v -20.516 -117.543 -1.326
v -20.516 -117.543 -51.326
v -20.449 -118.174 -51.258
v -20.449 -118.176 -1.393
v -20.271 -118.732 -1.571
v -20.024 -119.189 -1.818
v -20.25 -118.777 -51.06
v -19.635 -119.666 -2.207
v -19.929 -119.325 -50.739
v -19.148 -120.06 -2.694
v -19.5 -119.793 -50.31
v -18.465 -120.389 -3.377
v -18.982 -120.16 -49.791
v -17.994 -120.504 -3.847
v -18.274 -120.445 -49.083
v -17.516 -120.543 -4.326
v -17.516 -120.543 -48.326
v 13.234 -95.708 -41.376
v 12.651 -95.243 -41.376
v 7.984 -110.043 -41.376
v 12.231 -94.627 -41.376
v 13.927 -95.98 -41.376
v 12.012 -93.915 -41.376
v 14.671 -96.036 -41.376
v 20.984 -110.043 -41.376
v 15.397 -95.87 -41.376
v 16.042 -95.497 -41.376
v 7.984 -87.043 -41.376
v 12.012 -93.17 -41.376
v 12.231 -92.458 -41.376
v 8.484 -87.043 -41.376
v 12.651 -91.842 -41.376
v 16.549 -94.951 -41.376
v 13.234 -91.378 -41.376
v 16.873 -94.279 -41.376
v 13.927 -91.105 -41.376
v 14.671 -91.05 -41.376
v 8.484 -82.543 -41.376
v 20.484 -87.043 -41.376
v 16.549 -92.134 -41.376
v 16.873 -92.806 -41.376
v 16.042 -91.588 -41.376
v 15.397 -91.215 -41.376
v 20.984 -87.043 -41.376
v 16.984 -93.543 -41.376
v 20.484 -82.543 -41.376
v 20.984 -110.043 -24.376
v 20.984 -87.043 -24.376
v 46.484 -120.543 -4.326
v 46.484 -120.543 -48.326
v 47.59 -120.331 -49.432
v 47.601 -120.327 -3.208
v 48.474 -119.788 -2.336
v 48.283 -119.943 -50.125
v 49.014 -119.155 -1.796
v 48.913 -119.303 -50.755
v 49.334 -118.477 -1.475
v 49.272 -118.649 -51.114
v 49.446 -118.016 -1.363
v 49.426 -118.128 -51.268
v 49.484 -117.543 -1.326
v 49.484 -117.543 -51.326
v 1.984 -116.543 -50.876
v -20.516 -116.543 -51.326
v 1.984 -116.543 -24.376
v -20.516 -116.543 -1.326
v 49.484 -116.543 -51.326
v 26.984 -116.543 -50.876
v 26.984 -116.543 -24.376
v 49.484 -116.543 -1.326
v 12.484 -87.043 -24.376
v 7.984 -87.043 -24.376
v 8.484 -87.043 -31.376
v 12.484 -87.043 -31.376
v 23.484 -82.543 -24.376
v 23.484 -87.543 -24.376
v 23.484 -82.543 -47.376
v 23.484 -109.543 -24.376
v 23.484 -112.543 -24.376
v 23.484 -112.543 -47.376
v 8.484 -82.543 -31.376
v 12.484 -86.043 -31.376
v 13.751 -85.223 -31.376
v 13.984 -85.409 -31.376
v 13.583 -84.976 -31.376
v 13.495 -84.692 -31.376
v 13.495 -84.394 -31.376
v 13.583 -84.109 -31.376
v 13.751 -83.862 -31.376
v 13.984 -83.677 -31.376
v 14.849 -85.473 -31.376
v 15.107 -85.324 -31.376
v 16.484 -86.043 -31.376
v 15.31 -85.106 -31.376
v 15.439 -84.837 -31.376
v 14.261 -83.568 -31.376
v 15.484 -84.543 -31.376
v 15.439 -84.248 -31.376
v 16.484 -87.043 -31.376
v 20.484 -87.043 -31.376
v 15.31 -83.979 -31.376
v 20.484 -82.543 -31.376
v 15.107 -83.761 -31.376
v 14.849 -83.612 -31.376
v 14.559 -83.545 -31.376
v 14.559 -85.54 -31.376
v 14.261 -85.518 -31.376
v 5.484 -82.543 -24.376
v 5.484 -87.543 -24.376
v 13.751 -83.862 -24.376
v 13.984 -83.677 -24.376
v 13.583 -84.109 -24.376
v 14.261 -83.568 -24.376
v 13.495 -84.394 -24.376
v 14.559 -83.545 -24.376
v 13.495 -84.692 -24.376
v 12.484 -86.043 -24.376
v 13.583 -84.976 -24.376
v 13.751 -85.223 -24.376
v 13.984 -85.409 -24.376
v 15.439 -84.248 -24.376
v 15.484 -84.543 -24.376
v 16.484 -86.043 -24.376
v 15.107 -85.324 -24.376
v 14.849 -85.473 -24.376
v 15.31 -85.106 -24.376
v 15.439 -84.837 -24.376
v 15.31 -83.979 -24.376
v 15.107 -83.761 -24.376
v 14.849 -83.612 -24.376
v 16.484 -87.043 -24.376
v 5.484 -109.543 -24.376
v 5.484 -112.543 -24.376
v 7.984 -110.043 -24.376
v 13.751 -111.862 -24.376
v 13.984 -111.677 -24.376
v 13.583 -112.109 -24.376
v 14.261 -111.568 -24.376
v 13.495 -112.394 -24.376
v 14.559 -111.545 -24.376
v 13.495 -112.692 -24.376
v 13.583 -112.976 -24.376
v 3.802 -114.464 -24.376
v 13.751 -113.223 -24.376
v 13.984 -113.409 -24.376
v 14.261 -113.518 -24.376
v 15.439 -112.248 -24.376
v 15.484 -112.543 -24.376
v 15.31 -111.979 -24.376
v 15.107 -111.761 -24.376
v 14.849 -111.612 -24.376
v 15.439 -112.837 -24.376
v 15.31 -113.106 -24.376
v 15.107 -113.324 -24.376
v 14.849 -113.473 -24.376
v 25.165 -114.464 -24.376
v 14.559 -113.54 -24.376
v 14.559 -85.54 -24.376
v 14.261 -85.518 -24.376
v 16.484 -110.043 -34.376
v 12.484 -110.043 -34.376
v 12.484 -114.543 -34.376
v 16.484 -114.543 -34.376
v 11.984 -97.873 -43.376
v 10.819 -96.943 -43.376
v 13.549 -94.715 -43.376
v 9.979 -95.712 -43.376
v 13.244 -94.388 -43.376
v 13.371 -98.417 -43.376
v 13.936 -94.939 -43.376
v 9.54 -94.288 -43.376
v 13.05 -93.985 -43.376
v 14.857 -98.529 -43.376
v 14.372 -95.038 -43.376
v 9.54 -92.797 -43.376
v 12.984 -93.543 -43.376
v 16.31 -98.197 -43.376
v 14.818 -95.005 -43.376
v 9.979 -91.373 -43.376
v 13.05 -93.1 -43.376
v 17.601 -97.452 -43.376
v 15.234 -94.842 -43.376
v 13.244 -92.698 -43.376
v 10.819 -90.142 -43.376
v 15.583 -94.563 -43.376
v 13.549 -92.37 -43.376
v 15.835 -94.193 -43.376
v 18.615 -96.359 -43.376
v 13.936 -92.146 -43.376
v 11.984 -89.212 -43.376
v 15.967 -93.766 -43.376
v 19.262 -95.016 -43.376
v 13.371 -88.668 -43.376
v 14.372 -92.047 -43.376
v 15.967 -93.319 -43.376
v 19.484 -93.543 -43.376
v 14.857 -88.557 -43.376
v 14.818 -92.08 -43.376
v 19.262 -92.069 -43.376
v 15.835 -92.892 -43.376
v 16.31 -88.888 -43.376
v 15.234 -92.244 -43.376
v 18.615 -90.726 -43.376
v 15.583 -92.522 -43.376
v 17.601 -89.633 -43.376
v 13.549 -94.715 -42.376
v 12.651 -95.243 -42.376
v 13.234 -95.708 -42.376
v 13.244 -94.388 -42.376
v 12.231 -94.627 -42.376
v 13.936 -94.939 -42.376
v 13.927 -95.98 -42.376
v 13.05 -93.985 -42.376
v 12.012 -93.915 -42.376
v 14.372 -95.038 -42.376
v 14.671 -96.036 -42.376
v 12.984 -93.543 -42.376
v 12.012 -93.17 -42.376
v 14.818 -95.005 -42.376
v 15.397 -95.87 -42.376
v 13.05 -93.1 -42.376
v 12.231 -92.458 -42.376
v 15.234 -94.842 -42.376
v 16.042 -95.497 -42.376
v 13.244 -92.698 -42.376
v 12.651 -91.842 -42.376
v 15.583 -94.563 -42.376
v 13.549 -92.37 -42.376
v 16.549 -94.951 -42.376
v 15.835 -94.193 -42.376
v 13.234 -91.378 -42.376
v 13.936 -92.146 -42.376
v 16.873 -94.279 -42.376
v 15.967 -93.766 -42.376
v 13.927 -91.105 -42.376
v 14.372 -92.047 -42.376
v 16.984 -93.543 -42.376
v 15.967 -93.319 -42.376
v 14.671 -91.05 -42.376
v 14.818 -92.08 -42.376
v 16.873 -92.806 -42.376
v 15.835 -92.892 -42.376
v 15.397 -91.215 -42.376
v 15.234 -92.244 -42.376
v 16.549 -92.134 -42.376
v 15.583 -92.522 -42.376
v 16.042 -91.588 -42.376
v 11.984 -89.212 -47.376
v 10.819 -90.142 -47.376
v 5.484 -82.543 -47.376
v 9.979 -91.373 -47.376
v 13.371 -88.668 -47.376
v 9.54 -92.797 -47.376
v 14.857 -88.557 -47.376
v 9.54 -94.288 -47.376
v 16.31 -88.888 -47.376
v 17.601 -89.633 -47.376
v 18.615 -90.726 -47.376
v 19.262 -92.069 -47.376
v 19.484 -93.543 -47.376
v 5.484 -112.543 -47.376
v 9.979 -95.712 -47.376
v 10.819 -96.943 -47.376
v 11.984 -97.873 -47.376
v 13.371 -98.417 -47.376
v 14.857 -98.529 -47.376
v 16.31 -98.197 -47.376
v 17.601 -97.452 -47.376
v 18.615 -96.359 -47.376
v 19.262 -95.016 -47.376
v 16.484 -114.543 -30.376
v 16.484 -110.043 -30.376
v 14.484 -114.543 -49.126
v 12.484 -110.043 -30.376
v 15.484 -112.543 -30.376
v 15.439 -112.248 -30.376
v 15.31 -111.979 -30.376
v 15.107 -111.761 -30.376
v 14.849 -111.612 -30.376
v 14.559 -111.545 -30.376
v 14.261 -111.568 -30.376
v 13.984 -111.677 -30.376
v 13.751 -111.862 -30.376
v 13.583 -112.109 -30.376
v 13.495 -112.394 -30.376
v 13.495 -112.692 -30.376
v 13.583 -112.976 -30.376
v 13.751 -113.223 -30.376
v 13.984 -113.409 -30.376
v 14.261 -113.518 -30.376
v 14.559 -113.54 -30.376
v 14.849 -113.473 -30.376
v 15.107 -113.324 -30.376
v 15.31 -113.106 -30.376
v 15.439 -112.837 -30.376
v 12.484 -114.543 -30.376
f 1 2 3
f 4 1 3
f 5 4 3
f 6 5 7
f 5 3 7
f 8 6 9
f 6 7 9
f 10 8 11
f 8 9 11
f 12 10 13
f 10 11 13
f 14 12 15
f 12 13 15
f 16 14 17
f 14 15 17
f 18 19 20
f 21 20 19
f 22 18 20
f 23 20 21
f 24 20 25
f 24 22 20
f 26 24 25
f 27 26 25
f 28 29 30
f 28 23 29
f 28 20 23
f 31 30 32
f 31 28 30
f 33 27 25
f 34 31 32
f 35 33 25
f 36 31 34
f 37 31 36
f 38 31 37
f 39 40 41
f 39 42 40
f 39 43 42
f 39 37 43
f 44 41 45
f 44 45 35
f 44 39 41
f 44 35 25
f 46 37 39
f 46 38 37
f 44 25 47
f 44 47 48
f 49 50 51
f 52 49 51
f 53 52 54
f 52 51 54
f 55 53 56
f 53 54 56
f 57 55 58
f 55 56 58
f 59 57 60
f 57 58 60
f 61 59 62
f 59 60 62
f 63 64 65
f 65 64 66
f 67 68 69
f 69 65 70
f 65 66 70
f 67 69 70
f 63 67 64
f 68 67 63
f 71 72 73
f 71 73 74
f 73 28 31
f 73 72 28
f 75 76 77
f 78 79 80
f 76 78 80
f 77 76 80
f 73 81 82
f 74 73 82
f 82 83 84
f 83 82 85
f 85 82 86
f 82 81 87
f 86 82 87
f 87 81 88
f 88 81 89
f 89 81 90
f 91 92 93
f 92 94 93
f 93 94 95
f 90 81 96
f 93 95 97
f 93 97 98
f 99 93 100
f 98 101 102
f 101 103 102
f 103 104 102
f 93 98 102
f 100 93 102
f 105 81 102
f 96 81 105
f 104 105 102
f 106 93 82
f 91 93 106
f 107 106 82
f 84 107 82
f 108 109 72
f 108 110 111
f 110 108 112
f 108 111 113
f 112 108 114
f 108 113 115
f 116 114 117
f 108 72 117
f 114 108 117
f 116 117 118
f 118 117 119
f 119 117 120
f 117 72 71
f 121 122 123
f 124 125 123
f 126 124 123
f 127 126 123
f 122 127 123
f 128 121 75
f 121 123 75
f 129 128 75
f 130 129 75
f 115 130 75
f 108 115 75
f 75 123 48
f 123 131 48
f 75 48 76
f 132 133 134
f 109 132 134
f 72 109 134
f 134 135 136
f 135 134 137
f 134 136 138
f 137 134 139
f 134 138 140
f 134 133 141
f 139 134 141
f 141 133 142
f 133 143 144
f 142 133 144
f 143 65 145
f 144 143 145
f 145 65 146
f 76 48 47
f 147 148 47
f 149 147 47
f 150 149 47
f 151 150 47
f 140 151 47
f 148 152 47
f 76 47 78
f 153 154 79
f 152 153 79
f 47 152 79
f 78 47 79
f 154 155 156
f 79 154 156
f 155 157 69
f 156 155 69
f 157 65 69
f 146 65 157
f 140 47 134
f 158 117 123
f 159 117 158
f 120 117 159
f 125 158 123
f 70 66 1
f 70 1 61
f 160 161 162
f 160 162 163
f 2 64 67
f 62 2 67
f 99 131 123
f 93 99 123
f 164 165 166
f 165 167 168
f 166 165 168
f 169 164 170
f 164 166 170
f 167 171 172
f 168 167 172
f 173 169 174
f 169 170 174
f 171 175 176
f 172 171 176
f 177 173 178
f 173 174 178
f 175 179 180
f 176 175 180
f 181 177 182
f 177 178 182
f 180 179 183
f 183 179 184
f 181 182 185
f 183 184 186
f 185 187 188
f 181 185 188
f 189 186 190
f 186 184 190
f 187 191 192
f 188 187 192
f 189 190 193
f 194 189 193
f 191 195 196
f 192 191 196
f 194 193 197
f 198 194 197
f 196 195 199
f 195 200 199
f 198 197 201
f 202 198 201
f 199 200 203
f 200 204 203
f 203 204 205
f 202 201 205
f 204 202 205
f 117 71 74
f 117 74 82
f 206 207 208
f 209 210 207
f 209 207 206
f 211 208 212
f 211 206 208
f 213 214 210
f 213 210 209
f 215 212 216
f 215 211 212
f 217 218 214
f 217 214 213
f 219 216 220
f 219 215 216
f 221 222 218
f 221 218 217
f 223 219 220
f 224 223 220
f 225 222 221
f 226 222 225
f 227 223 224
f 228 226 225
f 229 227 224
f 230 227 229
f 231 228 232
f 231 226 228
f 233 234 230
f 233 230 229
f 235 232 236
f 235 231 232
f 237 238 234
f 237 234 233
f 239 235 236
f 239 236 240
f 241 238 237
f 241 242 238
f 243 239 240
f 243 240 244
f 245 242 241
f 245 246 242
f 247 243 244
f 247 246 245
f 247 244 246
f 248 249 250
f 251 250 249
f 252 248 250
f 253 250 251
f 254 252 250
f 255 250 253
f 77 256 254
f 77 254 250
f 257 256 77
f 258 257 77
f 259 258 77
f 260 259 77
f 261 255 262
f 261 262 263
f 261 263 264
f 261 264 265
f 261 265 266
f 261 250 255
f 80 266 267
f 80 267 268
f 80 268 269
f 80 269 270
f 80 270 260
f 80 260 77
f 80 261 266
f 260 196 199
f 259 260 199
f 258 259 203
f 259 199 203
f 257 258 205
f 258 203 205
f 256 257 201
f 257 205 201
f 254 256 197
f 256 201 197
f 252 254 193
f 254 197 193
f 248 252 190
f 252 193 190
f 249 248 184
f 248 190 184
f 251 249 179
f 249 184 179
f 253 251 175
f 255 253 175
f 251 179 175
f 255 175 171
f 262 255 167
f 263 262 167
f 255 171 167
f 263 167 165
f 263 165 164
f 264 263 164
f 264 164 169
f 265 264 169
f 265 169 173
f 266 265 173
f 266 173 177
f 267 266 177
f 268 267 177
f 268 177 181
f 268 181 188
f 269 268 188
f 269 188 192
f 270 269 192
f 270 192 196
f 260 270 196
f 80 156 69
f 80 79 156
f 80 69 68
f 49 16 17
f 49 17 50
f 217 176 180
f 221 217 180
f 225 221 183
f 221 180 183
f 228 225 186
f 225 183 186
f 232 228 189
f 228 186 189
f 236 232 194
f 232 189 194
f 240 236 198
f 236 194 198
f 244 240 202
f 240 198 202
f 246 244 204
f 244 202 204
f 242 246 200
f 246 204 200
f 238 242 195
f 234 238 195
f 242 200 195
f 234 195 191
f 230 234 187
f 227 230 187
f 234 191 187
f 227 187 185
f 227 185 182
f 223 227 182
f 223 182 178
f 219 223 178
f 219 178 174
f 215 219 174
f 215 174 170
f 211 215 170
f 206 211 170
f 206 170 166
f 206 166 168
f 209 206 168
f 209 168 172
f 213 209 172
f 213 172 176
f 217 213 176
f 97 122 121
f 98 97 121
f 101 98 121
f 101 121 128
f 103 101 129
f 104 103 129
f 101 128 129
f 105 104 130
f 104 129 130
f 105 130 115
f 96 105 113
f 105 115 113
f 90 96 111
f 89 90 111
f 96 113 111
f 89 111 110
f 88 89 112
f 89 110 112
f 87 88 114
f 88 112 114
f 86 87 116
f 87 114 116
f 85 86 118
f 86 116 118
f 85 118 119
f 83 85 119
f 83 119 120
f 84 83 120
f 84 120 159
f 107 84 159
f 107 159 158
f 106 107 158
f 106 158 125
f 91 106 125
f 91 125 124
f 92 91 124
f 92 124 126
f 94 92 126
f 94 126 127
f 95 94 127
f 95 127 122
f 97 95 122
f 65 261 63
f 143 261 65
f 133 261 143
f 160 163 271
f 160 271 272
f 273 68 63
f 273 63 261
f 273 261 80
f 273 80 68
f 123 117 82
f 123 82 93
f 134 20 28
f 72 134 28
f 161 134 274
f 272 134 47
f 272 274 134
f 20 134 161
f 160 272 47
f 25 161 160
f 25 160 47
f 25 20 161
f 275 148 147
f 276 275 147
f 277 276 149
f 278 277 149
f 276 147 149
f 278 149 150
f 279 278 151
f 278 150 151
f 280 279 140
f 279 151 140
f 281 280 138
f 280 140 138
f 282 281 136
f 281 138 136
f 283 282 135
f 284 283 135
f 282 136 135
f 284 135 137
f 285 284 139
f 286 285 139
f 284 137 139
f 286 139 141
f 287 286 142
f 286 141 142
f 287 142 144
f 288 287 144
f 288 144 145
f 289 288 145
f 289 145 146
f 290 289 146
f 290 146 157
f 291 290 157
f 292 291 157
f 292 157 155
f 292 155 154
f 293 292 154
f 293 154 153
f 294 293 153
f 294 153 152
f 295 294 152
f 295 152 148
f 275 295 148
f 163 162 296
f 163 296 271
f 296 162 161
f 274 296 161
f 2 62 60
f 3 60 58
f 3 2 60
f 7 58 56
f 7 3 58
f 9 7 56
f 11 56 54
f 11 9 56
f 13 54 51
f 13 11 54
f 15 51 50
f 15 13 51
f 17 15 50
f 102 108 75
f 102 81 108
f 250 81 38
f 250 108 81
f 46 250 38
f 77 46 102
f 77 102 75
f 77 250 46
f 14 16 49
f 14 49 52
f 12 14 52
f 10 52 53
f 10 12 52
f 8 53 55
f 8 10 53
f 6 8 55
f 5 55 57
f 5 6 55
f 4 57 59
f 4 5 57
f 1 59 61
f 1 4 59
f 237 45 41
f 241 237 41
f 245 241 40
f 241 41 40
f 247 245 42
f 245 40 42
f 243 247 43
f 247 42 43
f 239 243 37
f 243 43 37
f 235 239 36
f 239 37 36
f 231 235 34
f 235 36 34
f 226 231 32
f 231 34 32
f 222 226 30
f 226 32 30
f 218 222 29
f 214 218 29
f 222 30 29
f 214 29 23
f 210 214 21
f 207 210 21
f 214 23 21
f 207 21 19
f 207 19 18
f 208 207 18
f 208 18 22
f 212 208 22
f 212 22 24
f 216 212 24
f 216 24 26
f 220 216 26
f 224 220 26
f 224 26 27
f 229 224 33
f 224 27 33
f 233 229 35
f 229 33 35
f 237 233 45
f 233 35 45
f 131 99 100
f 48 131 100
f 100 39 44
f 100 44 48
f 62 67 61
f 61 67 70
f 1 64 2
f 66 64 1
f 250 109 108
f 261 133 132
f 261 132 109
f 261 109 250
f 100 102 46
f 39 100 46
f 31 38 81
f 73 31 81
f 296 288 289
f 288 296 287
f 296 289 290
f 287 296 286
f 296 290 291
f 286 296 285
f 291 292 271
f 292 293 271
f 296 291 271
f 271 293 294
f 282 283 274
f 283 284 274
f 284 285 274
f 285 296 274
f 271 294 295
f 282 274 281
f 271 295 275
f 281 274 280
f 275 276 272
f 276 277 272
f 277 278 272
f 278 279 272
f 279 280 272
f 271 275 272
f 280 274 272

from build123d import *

# Parameters (mm, degrees)
BOSS_EXTRUDE1_DEPTH     = 22
SKETCH2_W               = 18.000000089
SKETCH2_H               = 20
BOSS_EXTRUDE2_DEPTH     = 7
SKETCH3_W               = 70
SKETCH3_H               = 50
BOSS_EXTRUDE3_DEPTH     = 4
SKETCH31_W              = 18.000000089
SKETCH31_H              = 3
BOSS_EXTRUDE7_DEPTH     = 34
CUT_EXTRUDE1_REACH      = 52
CUT_EXTRUDE_THIN1_REACH = 72
SKETCH7_W               = 25.000000089
SKETCH7_H               = 30
SKETCH8_W               = 18.000000089
SKETCH8_H               = 23
CUT_EXTRUDE2_DEPTH      = 27.000000055
CUT_EXTRUDE2_DEPTH_BACK = 45.000000145
SKETCH10_R              = 1
CUT_EXTRUDE3_DEPTH      = 10
SKETCH12_W              = 4
SKETCH12_H              = 5
CUT_EXTRUDE4_DEPTH      = 4
SKETCH13_W              = 18.000000089
SKETCH13_H              = 23
BOSS_EXTRUDE4_DEPTH     = 5
SKETCH14_R              = 1
CUT_EXTRUDE5_DEPTH      = 10
CUT_EXTRUDE6_REACH      = 40
CUT_EXTRUDE10_START     = -17
SKETCH29_W              = 13
SKETCH29_H              = 23
CUT_EXTRUDE10_DEPTH     = 17
SKETCH30_W              = 4
SKETCH30_H              = 1
CUT_EXTRUDE11_DEPTH     = 7
SKETCH21_R              = 5
CUT_EXTRUDE12_DEPTH     = 6
SKETCH32_R              = 4.999999958
BOSS_EXTRUDE8_DEPTH     = 2
CUT_EXTRUDE13_REACH     = 44.05
SKETCH33_R              = 1.5
SKETCH34_R              = 2.5
CUT_EXTRUDE14_DEPTH     = 1


with BuildPart() as part:
    # Sketch1 → Boss-Extrude1 (new body)
    with BuildSketch(Plane.XZ.offset(109.542579658)):
        Polygon((23.483775445, -24.37606884), (23.483775445, -44.37606884), (5.483775356, -44.37606884), (5.483775356, -24.37606884), (8.483775356, -24.37606884), (8.483775445, -41.37606884), (20.483775445, -41.37606884), (20.483775445, -24.37606884), align=None)
    extrude(amount=-BOSS_EXTRUDE1_DEPTH)

    # Sketch2 → Boss-Extrude2 (add)
    with BuildSketch(Plane.XZ.offset(109.542579658)):
        with Locations((14.483775401, -34.37606884)):
            Rectangle(SKETCH2_W, SKETCH2_H)
    extrude(amount=BOSS_EXTRUDE2_DEPTH)

    # Sketch3 → Boss-Extrude3 (add)
    with BuildSketch(Plane.XZ.offset(116.542579658)):
        with Locations((14.4837754, -26.325627156)):
            Rectangle(SKETCH3_W, SKETCH3_H)
    extrude(amount=BOSS_EXTRUDE3_DEPTH)

    # Sketch31 → Boss-Extrude7 (add)
    with BuildSketch(Plane(origin=(0, -116.542579658, 0), x_dir=(1, 0, 0), z_dir=(0, 1, 0))):
        with Locations((14.483775401, 45.87606884)):
            Rectangle(SKETCH31_W, SKETCH31_H)
    extrude(amount=BOSS_EXTRUDE7_DEPTH)

    # Sketch4 → Cut-Extrude1 (cut, up to next)
    with BuildSketch(Plane(origin=(0, 0, -51.325627156), x_dir=(-1, 0, 0), z_dir=(0, 0, -1)), mode=Mode.PRIVATE) as cut_extrude1_sk1:
        with BuildLine():
            Line((-49.4837754, -117.542579658), (-49.4837754, -120.542579658))
            Line((-49.4837754, -120.542579658), (-46.4837754, -120.542579658))
            ThreePointArc((-46.4837754, -120.542579658), (-48.605095744, -119.663900001), (-49.4837754, -117.542579658))
        make_face()
    cut_extrude1_tool1 = extrude(cut_extrude1_sk1.sketch, amount=-CUT_EXTRUDE1_REACH, mode=Mode.PRIVATE) & part.part
    add(cut_extrude1_tool1.solids().sort_by_distance((48.813672, -119.872476, -51.325627))[0], mode=Mode.SUBTRACT)
    # Sketch4 → Cut-Extrude1 (cut, up to next)
    with BuildSketch(Plane(origin=(0, 0, -51.325627156), x_dir=(-1, 0, 0), z_dir=(0, 0, -1)), mode=Mode.PRIVATE) as cut_extrude1_sk2:
        with BuildLine():
            Line((17.5162246, -120.542579658), (20.5162246, -120.542579658))
            Line((20.5162246, -120.542579658), (20.5162246, -117.542579658))
            ThreePointArc((20.5162246, -117.542579658), (19.637544943, -119.663900001), (17.5162246, -120.542579658))
        make_face()
    cut_extrude1_tool2 = extrude(cut_extrude1_sk2.sketch, amount=-CUT_EXTRUDE1_REACH, mode=Mode.PRIVATE) & part.part
    add(cut_extrude1_tool2.solids().sort_by_distance((-19.846121, -119.872476, -51.325627))[0], mode=Mode.SUBTRACT)

    # Sketch6 → Cut-Extrude-Thin1 (cut, up to next)
    with BuildSketch(Plane.ZY.offset(20.5162246), mode=Mode.PRIVATE) as cut_extrude_thin1_sk1:
        with BuildLine():
            ThreePointArc((-4.325627156, -120.542579658), (-2.204306812, -119.663900001), (-1.325627156, -117.542579658))
            Line((-1.325627156, -117.542579658), (8.674372844, -117.542579658))
            ThreePointArc((8.674372844, -117.542579658), (4.866761, -126.734967813), (-4.325627156, -130.542579658))
            Line((-4.325627156, -130.542579658), (-4.325627156, -120.542579658))
        make_face()
    cut_extrude_thin1_tool1 = extrude(cut_extrude_thin1_sk1.sketch, amount=-CUT_EXTRUDE_THIN1_REACH, mode=Mode.PRIVATE) & part.part
    add(cut_extrude_thin1_tool1.solids().sort_by_distance((-20.516225, -123.298683, 1.430477))[0], mode=Mode.SUBTRACT)
    # Sketch6 → Cut-Extrude-Thin1 (cut, up to next)
    with BuildSketch(Plane.ZY.offset(20.5162246), mode=Mode.PRIVATE) as cut_extrude_thin1_sk2:
        with BuildLine():
            ThreePointArc((-51.325627156, -117.542579658), (-50.446947499, -119.663900001), (-48.325627156, -120.542579658))
            Line((-48.325627156, -120.542579658), (-48.325627156, -130.542579658))
            ThreePointArc((-48.325627156, -130.542579658), (-57.518015311, -126.734967813), (-61.325627156, -117.542579658))
            Line((-61.325627156, -117.542579658), (-51.325627156, -117.542579658))
        make_face()
    cut_extrude_thin1_tool2 = extrude(cut_extrude_thin1_sk2.sketch, amount=-CUT_EXTRUDE_THIN1_REACH, mode=Mode.PRIVATE) & part.part
    add(cut_extrude_thin1_tool2.solids().sort_by_distance((-20.516225, -123.298683, -54.081731))[0], mode=Mode.SUBTRACT)

    # Sketch7 → Loft2 section 0
    with BuildSketch(Plane(origin=(0, -116.542579658, 0), x_dir=(1, 0, 0), z_dir=(0, 1, 0))):
        with Locations((14.483775401, 35.87606884)):
            Rectangle(SKETCH7_W, SKETCH7_H)
    # Sketch8 → Loft2 section 1
    with BuildSketch(Plane(origin=(0, -112.542579658, 0), x_dir=(1, 0, 0), z_dir=(0, 1, 0))):
        with Locations((14.483775401, 35.87606884)):
            Rectangle(SKETCH8_W, SKETCH8_H)
    loft()

    # Sketch9 → Cut-Extrude2 (cut, two sides)
    with BuildSketch(Plane.ZY.offset(-5.483775356)) as cut_extrude2_sk:
        Polygon((-24.37606884, -112.542579658), (-24.37606884, -116.542579658), (-20.87606884, -116.542579658), align=None)
    extrude(amount=CUT_EXTRUDE2_DEPTH, mode=Mode.SUBTRACT)
    extrude(cut_extrude2_sk.sketch, amount=-CUT_EXTRUDE2_DEPTH_BACK, mode=Mode.SUBTRACT)

    # Sketch10 → Cut-Extrude3 (cut)
    with BuildSketch(Plane.XY.offset(-24.37606884)):
        with Locations((14.483775445, -112.542579896)):
            Circle(SKETCH10_R)
    extrude(amount=-CUT_EXTRUDE3_DEPTH, mode=Mode.SUBTRACT)

    # Sketch12 → Cut-Extrude4 (cut)
    with BuildSketch(Plane.XY.offset(-34.37606884)):
        with Locations((14.483775445, -112.042579658)):
            Rectangle(SKETCH12_W, SKETCH12_H)
    extrude(amount=CUT_EXTRUDE4_DEPTH, mode=Mode.SUBTRACT)

    # Sketch13 → Boss-Extrude4 (add)
    with BuildSketch(Plane(origin=(0, -87.542579658, 0), x_dir=(1, 0, 0), z_dir=(0, 1, 0))):
        with Locations((14.483775401, 35.87606884)):
            Rectangle(SKETCH13_W, SKETCH13_H)
    extrude(amount=BOSS_EXTRUDE4_DEPTH)

    # Sketch14 → Cut-Extrude5 (cut)
    with BuildSketch(Plane.XY.offset(-24.37606884)):
        with Locations((14.483775445, -84.542579419)):
            Circle(SKETCH14_R)
    extrude(amount=-CUT_EXTRUDE5_DEPTH, mode=Mode.SUBTRACT)

    # Sketch16 → Cut-Extrude6 (cut, up to next)
    with BuildSketch(Plane(origin=(0, -82.542579658, 0), x_dir=(1, 0, 0), z_dir=(0, 1, 0)), mode=Mode.PRIVATE) as cut_extrude6_sk1:
        Polygon((14.4837754, 41.37606884), (8.4837754, 41.37606884), (8.4837754, 31.37606884), (20.4837754, 31.37606884), (20.4837754, 41.37606884), align=None)
    cut_extrude6_tool1 = extrude(cut_extrude6_sk1.sketch, amount=-CUT_EXTRUDE6_REACH, mode=Mode.PRIVATE) & part.part
    add(cut_extrude6_tool1.solids().sort_by_distance((14.483775, -82.54258, -36.376069))[0], mode=Mode.SUBTRACT)

    # Sketch29 → Cut-Extrude10 (cut)
    with BuildSketch(Plane.XY.offset(-24.37606884).offset(CUT_EXTRUDE10_START)):
        with Locations((14.483775445, -98.542579658)):
            Rectangle(SKETCH29_W, SKETCH29_H)
    extrude(amount=CUT_EXTRUDE10_DEPTH, mode=Mode.SUBTRACT)

    # Sketch30 → Cut-Extrude11 (cut)
    with BuildSketch(Plane.XY.offset(-24.37606884)):
        with Locations((14.483775445, -86.542579658)):
            Rectangle(SKETCH30_W, SKETCH30_H)
    extrude(amount=-CUT_EXTRUDE11_DEPTH, mode=Mode.SUBTRACT)

    # Sketch21 → Cut-Extrude12 (cut)
    with BuildSketch(Plane.XY.offset(-41.37606884)):
        with Locations((14.4837754, -93.542579583)):
            Circle(SKETCH21_R)
    extrude(amount=-CUT_EXTRUDE12_DEPTH, mode=Mode.SUBTRACT)

    # Sketch32 → Boss-Extrude8 (add)
    with BuildSketch(Plane.XY.offset(-41.37606884)):
        with Locations((14.483775445, -93.542579583)):
            Circle(SKETCH32_R)
    extrude(amount=-BOSS_EXTRUDE8_DEPTH)

    # Sketch33 → Cut-Extrude13 (cut, up to next)
    with BuildSketch(Plane(origin=(0, 0, -43.37606884), x_dir=(-1, 0, 0), z_dir=(0, 0, -1)), mode=Mode.PRIVATE) as cut_extrude13_sk1:
        with Locations((-14.4837754, -93.542579583)):
            Circle(SKETCH33_R)
    cut_extrude13_tool1 = extrude(cut_extrude13_sk1.sketch, amount=-CUT_EXTRUDE13_REACH, mode=Mode.PRIVATE) & part.part
    add(cut_extrude13_tool1.solids().sort_by_distance((14.483775, -93.54258, -43.376069))[0], mode=Mode.SUBTRACT)

    # Sketch34 → Cut-Extrude14 (cut)
    with BuildSketch(Plane.XY.offset(-41.37606884)):
        with Locations((14.4837754, -93.542579583)):
            Circle(SKETCH34_R)
    extrude(amount=-CUT_EXTRUDE14_DEPTH, mode=Mode.SUBTRACT)


solid = part.part
